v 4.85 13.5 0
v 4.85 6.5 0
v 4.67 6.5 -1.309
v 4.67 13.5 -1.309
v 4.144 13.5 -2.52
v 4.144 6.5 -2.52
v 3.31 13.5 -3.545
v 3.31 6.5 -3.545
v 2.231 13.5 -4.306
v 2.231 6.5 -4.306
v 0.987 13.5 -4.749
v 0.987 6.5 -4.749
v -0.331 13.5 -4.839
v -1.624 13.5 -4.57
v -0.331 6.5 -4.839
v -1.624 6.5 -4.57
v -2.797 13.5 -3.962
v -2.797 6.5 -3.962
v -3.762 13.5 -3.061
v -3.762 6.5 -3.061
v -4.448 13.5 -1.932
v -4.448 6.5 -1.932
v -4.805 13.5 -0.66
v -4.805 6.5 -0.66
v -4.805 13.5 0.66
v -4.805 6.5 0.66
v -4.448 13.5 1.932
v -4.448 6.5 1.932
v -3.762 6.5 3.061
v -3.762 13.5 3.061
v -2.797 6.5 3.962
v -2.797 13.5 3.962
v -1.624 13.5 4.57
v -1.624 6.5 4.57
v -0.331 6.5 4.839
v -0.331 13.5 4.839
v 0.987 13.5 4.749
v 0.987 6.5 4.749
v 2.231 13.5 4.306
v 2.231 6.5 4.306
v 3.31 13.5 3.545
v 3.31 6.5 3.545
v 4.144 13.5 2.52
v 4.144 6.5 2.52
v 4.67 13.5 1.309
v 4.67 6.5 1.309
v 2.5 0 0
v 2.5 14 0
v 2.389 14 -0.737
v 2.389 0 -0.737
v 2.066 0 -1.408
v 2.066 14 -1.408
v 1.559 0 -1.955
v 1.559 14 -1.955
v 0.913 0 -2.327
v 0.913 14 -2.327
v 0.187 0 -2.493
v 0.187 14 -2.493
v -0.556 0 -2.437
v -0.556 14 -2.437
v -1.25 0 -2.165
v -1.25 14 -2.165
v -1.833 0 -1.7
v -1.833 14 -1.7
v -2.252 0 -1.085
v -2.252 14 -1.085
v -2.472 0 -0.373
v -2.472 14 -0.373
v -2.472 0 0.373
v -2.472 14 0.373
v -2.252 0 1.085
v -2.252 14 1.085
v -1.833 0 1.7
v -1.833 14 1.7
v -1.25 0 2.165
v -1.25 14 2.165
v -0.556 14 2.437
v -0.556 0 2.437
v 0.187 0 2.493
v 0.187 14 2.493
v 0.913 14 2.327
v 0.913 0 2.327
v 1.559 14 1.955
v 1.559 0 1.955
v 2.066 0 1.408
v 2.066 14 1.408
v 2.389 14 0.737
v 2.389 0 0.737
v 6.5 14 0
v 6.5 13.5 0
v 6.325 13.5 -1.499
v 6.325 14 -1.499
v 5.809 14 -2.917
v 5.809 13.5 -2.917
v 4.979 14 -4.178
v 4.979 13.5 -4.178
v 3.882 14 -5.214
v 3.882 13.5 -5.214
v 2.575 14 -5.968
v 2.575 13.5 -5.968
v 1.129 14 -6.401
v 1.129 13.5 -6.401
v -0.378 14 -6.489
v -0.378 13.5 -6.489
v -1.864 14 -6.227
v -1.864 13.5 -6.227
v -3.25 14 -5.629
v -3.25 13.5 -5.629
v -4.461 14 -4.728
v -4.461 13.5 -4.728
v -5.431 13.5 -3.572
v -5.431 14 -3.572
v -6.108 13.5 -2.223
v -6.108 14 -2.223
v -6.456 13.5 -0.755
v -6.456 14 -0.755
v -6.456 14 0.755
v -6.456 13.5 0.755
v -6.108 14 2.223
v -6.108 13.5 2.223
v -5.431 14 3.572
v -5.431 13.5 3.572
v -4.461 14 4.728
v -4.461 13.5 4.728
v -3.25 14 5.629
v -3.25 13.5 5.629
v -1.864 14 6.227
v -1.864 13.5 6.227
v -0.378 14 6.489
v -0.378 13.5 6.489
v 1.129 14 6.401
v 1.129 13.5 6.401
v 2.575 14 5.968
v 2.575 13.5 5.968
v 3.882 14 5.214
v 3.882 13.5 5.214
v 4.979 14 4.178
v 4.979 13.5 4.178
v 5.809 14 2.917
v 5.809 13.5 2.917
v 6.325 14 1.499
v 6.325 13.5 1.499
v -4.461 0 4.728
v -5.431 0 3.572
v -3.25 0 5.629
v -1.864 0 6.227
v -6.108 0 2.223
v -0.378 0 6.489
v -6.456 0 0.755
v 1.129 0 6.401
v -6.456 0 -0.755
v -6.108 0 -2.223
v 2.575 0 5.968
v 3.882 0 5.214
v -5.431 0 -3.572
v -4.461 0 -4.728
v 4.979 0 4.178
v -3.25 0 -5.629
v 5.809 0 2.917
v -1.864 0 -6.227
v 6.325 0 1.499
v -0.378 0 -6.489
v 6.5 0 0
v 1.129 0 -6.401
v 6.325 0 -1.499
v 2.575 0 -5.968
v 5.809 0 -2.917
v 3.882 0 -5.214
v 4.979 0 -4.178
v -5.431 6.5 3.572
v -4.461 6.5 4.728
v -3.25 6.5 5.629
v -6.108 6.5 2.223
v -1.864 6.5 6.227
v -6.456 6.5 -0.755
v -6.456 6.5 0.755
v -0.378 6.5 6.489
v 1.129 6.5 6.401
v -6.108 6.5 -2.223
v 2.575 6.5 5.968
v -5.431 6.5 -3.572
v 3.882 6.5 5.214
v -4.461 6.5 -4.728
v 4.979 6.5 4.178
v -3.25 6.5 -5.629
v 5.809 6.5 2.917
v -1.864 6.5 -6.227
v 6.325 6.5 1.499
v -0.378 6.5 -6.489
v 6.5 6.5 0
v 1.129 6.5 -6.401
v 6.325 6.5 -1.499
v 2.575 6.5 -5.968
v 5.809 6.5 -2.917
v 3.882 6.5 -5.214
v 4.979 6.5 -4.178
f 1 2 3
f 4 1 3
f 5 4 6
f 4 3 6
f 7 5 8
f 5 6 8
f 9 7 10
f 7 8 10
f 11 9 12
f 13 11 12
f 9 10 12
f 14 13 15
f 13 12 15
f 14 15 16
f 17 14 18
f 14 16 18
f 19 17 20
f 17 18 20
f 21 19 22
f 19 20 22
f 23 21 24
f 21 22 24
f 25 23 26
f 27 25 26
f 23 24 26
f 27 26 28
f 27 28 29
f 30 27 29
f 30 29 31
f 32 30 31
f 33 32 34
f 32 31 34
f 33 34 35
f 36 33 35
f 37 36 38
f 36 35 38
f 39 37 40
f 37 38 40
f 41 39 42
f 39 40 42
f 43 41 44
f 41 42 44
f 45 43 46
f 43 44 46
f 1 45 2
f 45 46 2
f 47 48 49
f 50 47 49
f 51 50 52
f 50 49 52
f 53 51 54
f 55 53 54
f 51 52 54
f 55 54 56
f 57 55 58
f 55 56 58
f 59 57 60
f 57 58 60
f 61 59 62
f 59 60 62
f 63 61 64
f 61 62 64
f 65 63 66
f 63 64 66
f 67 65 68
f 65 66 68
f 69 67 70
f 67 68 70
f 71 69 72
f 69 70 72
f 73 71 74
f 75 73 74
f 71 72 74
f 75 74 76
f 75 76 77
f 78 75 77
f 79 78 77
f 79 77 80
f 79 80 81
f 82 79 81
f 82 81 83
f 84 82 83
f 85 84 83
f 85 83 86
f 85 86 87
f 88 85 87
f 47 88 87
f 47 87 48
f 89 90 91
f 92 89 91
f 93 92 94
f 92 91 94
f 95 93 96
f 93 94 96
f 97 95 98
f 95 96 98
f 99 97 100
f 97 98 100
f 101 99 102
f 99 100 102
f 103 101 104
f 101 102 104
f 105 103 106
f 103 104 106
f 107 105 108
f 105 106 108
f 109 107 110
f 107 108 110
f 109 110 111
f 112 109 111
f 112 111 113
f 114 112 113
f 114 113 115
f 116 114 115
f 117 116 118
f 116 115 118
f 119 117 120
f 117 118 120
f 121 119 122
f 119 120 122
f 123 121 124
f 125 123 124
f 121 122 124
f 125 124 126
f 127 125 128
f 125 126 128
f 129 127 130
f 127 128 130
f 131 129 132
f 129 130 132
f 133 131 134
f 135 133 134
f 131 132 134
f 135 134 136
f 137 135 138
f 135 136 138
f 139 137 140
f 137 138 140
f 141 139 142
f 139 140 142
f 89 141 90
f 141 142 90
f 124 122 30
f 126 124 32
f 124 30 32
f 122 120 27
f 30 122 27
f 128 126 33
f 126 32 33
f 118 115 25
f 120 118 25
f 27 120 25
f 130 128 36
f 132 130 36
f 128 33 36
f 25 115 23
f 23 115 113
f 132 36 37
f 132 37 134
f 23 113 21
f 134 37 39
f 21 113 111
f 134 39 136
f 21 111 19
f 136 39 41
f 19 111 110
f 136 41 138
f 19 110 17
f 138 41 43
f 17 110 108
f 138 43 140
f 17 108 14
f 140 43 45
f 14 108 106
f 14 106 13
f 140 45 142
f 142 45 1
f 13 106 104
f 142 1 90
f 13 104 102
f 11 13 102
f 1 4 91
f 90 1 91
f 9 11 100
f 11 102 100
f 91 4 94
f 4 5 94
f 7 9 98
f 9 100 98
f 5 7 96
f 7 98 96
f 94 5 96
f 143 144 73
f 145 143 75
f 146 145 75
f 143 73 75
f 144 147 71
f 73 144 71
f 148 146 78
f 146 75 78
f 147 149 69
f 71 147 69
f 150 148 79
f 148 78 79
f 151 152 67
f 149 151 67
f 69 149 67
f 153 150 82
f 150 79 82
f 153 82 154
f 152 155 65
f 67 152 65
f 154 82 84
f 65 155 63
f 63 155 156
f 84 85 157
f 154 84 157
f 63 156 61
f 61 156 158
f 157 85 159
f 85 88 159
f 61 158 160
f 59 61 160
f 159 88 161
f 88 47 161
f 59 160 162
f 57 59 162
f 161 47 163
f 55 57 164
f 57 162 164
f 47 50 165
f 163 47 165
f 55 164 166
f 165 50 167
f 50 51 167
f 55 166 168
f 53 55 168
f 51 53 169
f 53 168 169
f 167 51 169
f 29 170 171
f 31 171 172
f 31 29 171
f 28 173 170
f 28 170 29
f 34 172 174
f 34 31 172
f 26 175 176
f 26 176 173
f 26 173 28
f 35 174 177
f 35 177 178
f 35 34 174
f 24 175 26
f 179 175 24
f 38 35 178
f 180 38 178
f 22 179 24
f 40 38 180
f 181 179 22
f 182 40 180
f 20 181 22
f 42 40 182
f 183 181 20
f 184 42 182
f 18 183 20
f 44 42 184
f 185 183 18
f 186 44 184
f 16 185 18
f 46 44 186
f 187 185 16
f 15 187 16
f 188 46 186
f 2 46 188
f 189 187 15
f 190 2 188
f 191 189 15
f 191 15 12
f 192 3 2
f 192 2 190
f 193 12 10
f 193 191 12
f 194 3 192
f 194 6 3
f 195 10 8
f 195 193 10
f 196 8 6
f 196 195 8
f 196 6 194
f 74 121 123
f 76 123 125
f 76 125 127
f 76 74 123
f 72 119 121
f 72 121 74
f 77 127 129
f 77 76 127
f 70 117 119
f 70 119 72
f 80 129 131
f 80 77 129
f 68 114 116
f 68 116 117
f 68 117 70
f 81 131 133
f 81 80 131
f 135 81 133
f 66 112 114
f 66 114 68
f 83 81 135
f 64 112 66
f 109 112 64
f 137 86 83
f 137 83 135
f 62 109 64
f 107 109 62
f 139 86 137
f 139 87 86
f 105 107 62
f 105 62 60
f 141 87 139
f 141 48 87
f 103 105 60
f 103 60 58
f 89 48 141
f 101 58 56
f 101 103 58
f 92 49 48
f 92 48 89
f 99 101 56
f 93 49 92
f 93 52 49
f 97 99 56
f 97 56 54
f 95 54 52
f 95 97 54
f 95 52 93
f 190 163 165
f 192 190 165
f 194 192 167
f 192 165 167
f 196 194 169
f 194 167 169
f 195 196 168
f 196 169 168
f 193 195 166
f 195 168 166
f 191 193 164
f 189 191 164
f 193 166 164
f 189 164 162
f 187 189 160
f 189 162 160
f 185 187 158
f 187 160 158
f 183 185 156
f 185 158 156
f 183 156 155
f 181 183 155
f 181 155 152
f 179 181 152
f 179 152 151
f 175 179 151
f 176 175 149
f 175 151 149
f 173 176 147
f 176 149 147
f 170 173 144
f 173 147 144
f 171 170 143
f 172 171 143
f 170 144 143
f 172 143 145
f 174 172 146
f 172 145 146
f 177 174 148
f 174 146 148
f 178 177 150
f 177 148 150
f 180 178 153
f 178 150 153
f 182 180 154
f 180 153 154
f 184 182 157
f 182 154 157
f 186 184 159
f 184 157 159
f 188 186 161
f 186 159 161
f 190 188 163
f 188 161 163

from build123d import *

# Parameters (mm, degrees)
SKETCH_1_R          = 6.5
EXTRUDE_1_DEPTH     = 6.5
SKETCH_2_R          = 4.85
EXTRUDE_2_DEPTH     = 7
SKETCH_3_R          = 6.5
EXTRUDE_3_DEPTH     = 0.5
SKETCH_4_R          = 2.5
CUT_EXTRUDE_1_DEPTH = 15


with BuildPart() as part:
    # 草图1 → 凸台-拉伸1 (new body)
    with BuildSketch(Plane(origin=(0, 0, 0), x_dir=(1, 0, 0), z_dir=(0, 1, 0))):
        Circle(SKETCH_1_R)
    extrude(amount=EXTRUDE_1_DEPTH)

    # 草图2 → 凸台-拉伸2 (add)
    with BuildSketch(Plane(origin=(0, 6.5, 0), x_dir=(1, 0, 0), z_dir=(0, 1, 0))):
        Circle(SKETCH_2_R)
    extrude(amount=EXTRUDE_2_DEPTH)

    # 草图3 → 凸台-拉伸3 (add)
    with BuildSketch(Plane(origin=(0, 13.5, 0), x_dir=(1, 0, 0), z_dir=(0, 1, 0))):
        Circle(SKETCH_3_R)
    extrude(amount=EXTRUDE_3_DEPTH)

    # 草图4 → 切除-拉伸1 (cut, through all)
    with BuildSketch(Plane(origin=(0, 14, 0), x_dir=(1, 0, 0), z_dir=(0, 1, 0))):
        Circle(SKETCH_4_R)
    extrude(amount=-CUT_EXTRUDE_1_DEPTH, mode=Mode.SUBTRACT)


solid = part.part
